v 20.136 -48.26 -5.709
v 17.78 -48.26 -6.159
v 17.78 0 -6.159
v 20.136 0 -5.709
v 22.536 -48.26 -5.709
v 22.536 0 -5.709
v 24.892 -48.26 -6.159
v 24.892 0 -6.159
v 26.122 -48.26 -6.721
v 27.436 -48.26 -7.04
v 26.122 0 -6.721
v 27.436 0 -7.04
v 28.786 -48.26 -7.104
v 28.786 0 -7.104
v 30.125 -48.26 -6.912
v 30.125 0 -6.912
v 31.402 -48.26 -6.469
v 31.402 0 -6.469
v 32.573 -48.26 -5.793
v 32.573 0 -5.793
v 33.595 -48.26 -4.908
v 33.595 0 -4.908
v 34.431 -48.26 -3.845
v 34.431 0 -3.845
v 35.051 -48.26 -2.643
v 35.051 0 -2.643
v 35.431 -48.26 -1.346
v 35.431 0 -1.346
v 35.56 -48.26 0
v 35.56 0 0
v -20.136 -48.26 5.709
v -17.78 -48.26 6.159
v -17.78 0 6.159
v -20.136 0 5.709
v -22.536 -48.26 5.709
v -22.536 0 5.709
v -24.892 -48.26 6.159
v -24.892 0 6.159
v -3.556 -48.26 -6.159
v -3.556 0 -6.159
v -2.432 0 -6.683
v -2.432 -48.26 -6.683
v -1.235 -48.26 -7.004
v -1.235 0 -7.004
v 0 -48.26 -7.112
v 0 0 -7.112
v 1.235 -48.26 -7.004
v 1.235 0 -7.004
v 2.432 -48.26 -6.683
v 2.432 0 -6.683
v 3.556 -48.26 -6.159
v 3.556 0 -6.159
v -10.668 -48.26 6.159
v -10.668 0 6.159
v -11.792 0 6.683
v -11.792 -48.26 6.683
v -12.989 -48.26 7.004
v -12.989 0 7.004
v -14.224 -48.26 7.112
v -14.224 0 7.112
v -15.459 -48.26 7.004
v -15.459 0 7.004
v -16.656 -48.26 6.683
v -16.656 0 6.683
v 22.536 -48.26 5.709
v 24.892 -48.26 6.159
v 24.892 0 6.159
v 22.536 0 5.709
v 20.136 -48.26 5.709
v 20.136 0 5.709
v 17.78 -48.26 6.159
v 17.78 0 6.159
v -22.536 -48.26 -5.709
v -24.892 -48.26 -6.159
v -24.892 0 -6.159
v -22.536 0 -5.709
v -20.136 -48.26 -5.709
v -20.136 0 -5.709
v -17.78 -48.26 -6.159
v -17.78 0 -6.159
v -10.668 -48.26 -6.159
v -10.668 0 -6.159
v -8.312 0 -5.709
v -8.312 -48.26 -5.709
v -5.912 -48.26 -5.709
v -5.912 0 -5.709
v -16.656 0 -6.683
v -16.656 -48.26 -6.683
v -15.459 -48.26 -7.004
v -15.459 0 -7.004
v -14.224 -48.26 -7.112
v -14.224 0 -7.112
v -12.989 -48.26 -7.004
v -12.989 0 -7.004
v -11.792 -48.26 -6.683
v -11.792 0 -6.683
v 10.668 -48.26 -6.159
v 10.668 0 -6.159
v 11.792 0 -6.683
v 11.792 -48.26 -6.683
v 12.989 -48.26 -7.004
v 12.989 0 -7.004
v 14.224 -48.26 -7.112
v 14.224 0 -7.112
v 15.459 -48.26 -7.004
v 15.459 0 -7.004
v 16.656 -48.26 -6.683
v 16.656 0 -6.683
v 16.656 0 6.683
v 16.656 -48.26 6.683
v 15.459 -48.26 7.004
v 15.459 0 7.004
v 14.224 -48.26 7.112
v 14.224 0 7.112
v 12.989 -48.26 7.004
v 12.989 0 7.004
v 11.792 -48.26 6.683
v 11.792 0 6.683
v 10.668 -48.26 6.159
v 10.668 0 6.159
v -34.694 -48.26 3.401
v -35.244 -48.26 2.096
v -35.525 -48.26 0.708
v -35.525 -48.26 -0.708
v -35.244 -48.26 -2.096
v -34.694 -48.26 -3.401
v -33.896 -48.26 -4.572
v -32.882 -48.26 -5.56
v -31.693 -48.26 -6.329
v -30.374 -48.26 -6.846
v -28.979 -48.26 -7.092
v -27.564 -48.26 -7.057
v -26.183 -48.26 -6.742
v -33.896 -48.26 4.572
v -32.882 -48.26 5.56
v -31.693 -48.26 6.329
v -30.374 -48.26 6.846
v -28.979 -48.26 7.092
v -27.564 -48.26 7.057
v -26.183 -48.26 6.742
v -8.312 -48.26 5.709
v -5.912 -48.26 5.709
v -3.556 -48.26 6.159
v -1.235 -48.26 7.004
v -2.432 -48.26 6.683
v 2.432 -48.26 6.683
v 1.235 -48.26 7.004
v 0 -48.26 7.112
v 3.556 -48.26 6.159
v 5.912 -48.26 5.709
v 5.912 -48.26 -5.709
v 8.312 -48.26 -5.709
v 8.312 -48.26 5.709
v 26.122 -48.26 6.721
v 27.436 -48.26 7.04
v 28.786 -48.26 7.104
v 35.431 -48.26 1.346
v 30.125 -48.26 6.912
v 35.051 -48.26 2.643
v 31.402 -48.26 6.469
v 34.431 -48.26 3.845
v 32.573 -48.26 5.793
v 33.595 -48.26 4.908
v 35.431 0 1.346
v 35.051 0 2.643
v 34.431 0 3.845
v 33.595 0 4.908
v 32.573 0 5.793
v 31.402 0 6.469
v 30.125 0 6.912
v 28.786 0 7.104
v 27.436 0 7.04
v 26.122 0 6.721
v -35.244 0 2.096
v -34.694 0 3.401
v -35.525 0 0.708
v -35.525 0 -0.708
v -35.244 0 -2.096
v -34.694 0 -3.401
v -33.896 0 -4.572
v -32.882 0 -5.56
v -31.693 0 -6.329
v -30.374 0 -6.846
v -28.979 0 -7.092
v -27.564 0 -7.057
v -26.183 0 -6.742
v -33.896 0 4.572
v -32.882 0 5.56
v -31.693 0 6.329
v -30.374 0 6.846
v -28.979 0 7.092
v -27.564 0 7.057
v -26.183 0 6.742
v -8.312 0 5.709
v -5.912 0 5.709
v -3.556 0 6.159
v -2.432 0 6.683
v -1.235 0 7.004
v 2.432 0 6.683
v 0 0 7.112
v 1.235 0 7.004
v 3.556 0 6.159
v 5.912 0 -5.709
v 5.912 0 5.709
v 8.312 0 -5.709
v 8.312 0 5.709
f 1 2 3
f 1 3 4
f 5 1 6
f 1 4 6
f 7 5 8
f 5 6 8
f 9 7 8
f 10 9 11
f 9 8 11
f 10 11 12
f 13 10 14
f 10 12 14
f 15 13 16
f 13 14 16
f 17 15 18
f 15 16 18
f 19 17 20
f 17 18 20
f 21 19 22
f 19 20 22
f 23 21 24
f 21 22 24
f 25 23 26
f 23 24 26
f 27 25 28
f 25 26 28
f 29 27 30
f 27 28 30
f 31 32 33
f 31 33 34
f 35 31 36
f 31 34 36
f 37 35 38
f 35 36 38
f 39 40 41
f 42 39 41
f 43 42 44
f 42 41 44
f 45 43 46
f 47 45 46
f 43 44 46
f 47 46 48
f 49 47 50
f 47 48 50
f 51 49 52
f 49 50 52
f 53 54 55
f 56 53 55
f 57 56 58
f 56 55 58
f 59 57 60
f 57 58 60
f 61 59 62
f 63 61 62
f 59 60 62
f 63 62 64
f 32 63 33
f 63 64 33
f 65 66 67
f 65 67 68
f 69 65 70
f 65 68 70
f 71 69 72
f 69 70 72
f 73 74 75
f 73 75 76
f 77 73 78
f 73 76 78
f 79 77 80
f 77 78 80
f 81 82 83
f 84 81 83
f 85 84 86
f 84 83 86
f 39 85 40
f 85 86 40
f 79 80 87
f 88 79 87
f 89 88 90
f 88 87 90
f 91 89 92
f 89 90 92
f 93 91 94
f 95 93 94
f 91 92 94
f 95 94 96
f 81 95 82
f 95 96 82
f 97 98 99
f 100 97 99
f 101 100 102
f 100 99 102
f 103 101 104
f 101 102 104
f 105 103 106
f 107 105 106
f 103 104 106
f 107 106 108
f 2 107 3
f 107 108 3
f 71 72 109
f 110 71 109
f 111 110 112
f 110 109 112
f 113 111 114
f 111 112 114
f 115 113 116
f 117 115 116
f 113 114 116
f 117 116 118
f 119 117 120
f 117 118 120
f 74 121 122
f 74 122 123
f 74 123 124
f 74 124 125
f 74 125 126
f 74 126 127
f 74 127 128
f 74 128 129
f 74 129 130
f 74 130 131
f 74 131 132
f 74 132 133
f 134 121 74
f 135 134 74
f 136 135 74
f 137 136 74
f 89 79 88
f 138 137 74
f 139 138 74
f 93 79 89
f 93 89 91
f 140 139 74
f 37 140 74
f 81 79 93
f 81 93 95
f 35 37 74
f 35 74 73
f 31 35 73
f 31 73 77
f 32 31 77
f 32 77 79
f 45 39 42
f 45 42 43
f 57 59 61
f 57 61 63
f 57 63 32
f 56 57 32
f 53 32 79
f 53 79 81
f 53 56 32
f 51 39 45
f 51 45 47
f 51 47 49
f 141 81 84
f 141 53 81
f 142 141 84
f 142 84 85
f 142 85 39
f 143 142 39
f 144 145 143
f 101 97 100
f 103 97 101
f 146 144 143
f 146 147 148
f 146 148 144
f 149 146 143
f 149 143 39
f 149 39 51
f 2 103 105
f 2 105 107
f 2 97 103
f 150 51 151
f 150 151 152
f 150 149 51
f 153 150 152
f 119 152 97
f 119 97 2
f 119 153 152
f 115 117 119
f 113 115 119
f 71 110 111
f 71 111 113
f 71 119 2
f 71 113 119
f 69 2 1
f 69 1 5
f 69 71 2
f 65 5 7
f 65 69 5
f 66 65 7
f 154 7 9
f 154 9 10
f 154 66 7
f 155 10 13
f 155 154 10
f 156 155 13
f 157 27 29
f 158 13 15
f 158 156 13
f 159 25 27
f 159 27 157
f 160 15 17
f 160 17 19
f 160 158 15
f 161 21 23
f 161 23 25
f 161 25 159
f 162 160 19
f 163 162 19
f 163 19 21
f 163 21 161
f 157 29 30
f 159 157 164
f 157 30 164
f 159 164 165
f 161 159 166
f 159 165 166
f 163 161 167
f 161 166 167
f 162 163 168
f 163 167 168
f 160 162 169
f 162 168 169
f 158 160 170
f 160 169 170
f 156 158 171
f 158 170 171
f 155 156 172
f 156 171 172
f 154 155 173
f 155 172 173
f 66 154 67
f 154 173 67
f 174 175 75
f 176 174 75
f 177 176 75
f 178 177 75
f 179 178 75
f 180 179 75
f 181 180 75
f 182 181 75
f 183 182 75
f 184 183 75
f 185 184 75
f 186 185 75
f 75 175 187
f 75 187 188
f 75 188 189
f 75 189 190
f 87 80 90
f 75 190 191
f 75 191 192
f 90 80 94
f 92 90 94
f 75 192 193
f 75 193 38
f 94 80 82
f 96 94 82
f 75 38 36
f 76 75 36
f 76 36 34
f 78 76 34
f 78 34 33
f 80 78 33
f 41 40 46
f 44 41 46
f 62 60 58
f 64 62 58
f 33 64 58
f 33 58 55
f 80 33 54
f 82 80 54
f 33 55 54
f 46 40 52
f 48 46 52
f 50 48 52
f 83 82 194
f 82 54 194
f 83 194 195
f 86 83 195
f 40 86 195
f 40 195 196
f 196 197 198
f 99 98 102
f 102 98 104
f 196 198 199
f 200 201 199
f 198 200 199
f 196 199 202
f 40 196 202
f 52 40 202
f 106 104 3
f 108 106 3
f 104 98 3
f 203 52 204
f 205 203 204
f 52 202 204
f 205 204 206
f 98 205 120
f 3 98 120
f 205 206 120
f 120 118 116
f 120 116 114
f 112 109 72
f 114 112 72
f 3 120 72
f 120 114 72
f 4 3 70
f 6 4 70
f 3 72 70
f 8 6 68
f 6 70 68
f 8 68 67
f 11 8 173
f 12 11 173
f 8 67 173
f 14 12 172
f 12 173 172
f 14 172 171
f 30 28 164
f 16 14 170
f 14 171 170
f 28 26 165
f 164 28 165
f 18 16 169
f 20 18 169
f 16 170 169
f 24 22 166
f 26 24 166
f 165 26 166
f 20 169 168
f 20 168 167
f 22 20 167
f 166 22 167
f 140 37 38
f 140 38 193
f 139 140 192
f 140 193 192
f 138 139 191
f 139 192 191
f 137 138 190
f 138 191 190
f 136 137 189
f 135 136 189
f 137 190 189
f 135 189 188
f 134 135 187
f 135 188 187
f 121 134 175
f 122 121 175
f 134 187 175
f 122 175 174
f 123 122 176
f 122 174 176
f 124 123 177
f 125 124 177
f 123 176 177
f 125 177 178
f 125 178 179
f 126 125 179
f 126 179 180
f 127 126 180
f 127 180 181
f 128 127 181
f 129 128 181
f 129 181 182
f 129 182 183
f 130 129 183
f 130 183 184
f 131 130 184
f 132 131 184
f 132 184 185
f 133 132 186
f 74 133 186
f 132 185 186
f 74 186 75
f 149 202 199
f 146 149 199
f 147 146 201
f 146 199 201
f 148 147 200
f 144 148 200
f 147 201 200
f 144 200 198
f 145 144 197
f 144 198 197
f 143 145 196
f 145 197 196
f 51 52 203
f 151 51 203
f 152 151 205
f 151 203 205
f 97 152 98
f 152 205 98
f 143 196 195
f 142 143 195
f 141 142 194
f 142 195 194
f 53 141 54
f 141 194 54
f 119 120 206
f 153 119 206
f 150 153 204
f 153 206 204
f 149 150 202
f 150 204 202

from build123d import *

# Parameters (mm, degrees)
F1_DEPTH = 48.26


# Not quite as in the source:
# - a feature names something its author has since deleted; it is built from what else it names


with BuildPart() as f1:
    # F0 (on Front) → F1 (new body)
    with BuildSketch(Plane.XZ):
        with BuildLine():
            ThreePointArc((3.556, -6.1591726717), (6.1591726717, -3.556), (7.112, 0))
            ThreePointArc((7.112, 0), (6.1591726717, 3.556), (3.556, 6.1591726717))
            ThreePointArc((3.556, 6.1591726717), (0, 7.112), (-3.556, 6.1591726717))
            ThreePointArc((-3.556, 6.1591726717), (-6.1591726717, 3.556), (-7.112, 0))
            ThreePointArc((-7.112, 0), (-6.1591726717, -3.556), (-3.556, -6.1591726717))
            ThreePointArc((-3.556, -6.1591726717), (0, -7.112), (3.556, -6.1591726717))
        make_face()
        with BuildLine():
            ThreePointArc((-10.668, -6.1591726717), (-8.0648273283, -3.556), (-7.112, 0))
            ThreePointArc((-7.112, 0), (-8.0648273283, 3.556), (-10.668, 6.1591726717))
            ThreePointArc((-10.668, 6.1591726717), (-14.224, 7.112), (-17.78, 6.1591726717))
            ThreePointArc((-17.78, 6.1591726717), (-20.3831726717, 3.556), (-21.336, 0))
            ThreePointArc((-21.336, 0), (-20.3831726717, -3.556), (-17.78, -6.1591726717))
            ThreePointArc((-17.78, -6.1591726717), (-14.224, -7.112), (-10.668, -6.1591726717))
        make_face()
        with BuildLine():
            ThreePointArc((-24.892, -6.1591726717), (-22.2888273283, -3.556), (-21.336, 0))
            ThreePointArc((-21.336, 0), (-22.2888273283, 3.556), (-24.892, 6.1591726717))
            ThreePointArc((-24.892, 6.1591726717), (-35.56, 0), (-24.892, -6.1591726717))
        make_face()
        with BuildLine():
            ThreePointArc((10.668, 6.1591726717), (8.0648273283, 3.556), (7.112, 0))
            ThreePointArc((7.112, 0), (8.0648273283, -3.556), (10.668, -6.1591726717))
            ThreePointArc((10.668, -6.1591726717), (14.224, -7.112), (17.78, -6.1591726717))
            ThreePointArc((17.78, -6.1591726717), (20.3831726717, -3.556), (21.336, 0))
            ThreePointArc((21.336, 0), (20.3831726717, 3.556), (17.78, 6.1591726717))
            ThreePointArc((17.78, 6.1591726717), (14.224, 7.112), (10.668, 6.1591726717))
        make_face()
        with BuildLine():
            ThreePointArc((24.892, 6.1591726717), (22.2888273283, 3.556), (21.336, 0))
            ThreePointArc((21.336, 0), (22.2888273283, -3.556), (24.892, -6.1591726717))
            ThreePointArc((24.892, -6.1591726717), (32.004, -6.1591726717), (35.56, 0))
            ThreePointArc((35.56, 0), (32.004, 6.1591726717), (24.892, 6.1591726717))
        make_face()
        with BuildLine():
            ThreePointArc((3.556, 6.1591726717), (6.1591726717, 3.556), (7.112, 0))
            ThreePointArc((7.112, 0), (8.0648273283, 3.556), (10.668, 6.1591726717))
            ThreePointArc((10.668, 6.1591726717), (7.112, 5.6520452644), (3.556, 6.1591726717))
        make_face()
        with BuildLine():
            ThreePointArc((24.892, 6.1591726717), (21.336, 5.6520452644), (17.78, 6.1591726717))
            ThreePointArc((17.78, 6.1591726717), (20.3831726717, 3.556), (21.336, 0))
            ThreePointArc((21.336, 0), (22.2888273283, 3.556), (24.892, 6.1591726717))
        make_face()
        with BuildLine():
            ThreePointArc((-7.112, 0), (-6.1591726717, 3.556), (-3.556, 6.1591726717))
            ThreePointArc((-3.556, 6.1591726717), (-7.112, 5.6520452644), (-10.668, 6.1591726717))
            ThreePointArc((-10.668, 6.1591726717), (-8.0648273283, 3.556), (-7.112, 0))
        make_face()
        with BuildLine():
            ThreePointArc((-21.336, 0), (-20.3831726717, 3.556), (-17.78, 6.1591726717))
            ThreePointArc((-17.78, 6.1591726717), (-21.336, 5.6520452644), (-24.892, 6.1591726717))
            ThreePointArc((-24.892, 6.1591726717), (-22.2888273283, 3.556), (-21.336, 0))
        make_face()
        with BuildLine():
            ThreePointArc((-24.892, -6.1591726717), (-21.336, -5.6520452644), (-17.78, -6.1591726717))
            ThreePointArc((-17.78, -6.1591726717), (-20.3831726717, -3.556), (-21.336, 0))
            ThreePointArc((-21.336, 0), (-22.2888273283, -3.556), (-24.892, -6.1591726717))
        make_face()
        with BuildLine():
            ThreePointArc((-10.668, -6.1591726717), (-7.112, -5.6520452644), (-3.556, -6.1591726717))
            ThreePointArc((-3.556, -6.1591726717), (-6.1591726717, -3.556), (-7.112, 0))
            ThreePointArc((-7.112, 0), (-8.0648273283, -3.556), (-10.668, -6.1591726717))
        make_face()
        with BuildLine():
            ThreePointArc((10.668, -6.1591726717), (8.0648273283, -3.556), (7.112, 0))
            ThreePointArc((7.112, 0), (6.1591726717, -3.556), (3.556, -6.1591726717))
            ThreePointArc((3.556, -6.1591726717), (7.112, -5.6520452644), (10.668, -6.1591726717))
        make_face()
        with BuildLine():
            ThreePointArc((21.336, 0), (20.3831726717, -3.556), (17.78, -6.1591726717))
            ThreePointArc((17.78, -6.1591726717), (21.336, -5.6520452644), (24.892, -6.1591726717))
            ThreePointArc((24.892, -6.1591726717), (22.2888273283, -3.556), (21.336, 0))
        make_face()
    extrude(amount=F1_DEPTH)


solid = f1.part
